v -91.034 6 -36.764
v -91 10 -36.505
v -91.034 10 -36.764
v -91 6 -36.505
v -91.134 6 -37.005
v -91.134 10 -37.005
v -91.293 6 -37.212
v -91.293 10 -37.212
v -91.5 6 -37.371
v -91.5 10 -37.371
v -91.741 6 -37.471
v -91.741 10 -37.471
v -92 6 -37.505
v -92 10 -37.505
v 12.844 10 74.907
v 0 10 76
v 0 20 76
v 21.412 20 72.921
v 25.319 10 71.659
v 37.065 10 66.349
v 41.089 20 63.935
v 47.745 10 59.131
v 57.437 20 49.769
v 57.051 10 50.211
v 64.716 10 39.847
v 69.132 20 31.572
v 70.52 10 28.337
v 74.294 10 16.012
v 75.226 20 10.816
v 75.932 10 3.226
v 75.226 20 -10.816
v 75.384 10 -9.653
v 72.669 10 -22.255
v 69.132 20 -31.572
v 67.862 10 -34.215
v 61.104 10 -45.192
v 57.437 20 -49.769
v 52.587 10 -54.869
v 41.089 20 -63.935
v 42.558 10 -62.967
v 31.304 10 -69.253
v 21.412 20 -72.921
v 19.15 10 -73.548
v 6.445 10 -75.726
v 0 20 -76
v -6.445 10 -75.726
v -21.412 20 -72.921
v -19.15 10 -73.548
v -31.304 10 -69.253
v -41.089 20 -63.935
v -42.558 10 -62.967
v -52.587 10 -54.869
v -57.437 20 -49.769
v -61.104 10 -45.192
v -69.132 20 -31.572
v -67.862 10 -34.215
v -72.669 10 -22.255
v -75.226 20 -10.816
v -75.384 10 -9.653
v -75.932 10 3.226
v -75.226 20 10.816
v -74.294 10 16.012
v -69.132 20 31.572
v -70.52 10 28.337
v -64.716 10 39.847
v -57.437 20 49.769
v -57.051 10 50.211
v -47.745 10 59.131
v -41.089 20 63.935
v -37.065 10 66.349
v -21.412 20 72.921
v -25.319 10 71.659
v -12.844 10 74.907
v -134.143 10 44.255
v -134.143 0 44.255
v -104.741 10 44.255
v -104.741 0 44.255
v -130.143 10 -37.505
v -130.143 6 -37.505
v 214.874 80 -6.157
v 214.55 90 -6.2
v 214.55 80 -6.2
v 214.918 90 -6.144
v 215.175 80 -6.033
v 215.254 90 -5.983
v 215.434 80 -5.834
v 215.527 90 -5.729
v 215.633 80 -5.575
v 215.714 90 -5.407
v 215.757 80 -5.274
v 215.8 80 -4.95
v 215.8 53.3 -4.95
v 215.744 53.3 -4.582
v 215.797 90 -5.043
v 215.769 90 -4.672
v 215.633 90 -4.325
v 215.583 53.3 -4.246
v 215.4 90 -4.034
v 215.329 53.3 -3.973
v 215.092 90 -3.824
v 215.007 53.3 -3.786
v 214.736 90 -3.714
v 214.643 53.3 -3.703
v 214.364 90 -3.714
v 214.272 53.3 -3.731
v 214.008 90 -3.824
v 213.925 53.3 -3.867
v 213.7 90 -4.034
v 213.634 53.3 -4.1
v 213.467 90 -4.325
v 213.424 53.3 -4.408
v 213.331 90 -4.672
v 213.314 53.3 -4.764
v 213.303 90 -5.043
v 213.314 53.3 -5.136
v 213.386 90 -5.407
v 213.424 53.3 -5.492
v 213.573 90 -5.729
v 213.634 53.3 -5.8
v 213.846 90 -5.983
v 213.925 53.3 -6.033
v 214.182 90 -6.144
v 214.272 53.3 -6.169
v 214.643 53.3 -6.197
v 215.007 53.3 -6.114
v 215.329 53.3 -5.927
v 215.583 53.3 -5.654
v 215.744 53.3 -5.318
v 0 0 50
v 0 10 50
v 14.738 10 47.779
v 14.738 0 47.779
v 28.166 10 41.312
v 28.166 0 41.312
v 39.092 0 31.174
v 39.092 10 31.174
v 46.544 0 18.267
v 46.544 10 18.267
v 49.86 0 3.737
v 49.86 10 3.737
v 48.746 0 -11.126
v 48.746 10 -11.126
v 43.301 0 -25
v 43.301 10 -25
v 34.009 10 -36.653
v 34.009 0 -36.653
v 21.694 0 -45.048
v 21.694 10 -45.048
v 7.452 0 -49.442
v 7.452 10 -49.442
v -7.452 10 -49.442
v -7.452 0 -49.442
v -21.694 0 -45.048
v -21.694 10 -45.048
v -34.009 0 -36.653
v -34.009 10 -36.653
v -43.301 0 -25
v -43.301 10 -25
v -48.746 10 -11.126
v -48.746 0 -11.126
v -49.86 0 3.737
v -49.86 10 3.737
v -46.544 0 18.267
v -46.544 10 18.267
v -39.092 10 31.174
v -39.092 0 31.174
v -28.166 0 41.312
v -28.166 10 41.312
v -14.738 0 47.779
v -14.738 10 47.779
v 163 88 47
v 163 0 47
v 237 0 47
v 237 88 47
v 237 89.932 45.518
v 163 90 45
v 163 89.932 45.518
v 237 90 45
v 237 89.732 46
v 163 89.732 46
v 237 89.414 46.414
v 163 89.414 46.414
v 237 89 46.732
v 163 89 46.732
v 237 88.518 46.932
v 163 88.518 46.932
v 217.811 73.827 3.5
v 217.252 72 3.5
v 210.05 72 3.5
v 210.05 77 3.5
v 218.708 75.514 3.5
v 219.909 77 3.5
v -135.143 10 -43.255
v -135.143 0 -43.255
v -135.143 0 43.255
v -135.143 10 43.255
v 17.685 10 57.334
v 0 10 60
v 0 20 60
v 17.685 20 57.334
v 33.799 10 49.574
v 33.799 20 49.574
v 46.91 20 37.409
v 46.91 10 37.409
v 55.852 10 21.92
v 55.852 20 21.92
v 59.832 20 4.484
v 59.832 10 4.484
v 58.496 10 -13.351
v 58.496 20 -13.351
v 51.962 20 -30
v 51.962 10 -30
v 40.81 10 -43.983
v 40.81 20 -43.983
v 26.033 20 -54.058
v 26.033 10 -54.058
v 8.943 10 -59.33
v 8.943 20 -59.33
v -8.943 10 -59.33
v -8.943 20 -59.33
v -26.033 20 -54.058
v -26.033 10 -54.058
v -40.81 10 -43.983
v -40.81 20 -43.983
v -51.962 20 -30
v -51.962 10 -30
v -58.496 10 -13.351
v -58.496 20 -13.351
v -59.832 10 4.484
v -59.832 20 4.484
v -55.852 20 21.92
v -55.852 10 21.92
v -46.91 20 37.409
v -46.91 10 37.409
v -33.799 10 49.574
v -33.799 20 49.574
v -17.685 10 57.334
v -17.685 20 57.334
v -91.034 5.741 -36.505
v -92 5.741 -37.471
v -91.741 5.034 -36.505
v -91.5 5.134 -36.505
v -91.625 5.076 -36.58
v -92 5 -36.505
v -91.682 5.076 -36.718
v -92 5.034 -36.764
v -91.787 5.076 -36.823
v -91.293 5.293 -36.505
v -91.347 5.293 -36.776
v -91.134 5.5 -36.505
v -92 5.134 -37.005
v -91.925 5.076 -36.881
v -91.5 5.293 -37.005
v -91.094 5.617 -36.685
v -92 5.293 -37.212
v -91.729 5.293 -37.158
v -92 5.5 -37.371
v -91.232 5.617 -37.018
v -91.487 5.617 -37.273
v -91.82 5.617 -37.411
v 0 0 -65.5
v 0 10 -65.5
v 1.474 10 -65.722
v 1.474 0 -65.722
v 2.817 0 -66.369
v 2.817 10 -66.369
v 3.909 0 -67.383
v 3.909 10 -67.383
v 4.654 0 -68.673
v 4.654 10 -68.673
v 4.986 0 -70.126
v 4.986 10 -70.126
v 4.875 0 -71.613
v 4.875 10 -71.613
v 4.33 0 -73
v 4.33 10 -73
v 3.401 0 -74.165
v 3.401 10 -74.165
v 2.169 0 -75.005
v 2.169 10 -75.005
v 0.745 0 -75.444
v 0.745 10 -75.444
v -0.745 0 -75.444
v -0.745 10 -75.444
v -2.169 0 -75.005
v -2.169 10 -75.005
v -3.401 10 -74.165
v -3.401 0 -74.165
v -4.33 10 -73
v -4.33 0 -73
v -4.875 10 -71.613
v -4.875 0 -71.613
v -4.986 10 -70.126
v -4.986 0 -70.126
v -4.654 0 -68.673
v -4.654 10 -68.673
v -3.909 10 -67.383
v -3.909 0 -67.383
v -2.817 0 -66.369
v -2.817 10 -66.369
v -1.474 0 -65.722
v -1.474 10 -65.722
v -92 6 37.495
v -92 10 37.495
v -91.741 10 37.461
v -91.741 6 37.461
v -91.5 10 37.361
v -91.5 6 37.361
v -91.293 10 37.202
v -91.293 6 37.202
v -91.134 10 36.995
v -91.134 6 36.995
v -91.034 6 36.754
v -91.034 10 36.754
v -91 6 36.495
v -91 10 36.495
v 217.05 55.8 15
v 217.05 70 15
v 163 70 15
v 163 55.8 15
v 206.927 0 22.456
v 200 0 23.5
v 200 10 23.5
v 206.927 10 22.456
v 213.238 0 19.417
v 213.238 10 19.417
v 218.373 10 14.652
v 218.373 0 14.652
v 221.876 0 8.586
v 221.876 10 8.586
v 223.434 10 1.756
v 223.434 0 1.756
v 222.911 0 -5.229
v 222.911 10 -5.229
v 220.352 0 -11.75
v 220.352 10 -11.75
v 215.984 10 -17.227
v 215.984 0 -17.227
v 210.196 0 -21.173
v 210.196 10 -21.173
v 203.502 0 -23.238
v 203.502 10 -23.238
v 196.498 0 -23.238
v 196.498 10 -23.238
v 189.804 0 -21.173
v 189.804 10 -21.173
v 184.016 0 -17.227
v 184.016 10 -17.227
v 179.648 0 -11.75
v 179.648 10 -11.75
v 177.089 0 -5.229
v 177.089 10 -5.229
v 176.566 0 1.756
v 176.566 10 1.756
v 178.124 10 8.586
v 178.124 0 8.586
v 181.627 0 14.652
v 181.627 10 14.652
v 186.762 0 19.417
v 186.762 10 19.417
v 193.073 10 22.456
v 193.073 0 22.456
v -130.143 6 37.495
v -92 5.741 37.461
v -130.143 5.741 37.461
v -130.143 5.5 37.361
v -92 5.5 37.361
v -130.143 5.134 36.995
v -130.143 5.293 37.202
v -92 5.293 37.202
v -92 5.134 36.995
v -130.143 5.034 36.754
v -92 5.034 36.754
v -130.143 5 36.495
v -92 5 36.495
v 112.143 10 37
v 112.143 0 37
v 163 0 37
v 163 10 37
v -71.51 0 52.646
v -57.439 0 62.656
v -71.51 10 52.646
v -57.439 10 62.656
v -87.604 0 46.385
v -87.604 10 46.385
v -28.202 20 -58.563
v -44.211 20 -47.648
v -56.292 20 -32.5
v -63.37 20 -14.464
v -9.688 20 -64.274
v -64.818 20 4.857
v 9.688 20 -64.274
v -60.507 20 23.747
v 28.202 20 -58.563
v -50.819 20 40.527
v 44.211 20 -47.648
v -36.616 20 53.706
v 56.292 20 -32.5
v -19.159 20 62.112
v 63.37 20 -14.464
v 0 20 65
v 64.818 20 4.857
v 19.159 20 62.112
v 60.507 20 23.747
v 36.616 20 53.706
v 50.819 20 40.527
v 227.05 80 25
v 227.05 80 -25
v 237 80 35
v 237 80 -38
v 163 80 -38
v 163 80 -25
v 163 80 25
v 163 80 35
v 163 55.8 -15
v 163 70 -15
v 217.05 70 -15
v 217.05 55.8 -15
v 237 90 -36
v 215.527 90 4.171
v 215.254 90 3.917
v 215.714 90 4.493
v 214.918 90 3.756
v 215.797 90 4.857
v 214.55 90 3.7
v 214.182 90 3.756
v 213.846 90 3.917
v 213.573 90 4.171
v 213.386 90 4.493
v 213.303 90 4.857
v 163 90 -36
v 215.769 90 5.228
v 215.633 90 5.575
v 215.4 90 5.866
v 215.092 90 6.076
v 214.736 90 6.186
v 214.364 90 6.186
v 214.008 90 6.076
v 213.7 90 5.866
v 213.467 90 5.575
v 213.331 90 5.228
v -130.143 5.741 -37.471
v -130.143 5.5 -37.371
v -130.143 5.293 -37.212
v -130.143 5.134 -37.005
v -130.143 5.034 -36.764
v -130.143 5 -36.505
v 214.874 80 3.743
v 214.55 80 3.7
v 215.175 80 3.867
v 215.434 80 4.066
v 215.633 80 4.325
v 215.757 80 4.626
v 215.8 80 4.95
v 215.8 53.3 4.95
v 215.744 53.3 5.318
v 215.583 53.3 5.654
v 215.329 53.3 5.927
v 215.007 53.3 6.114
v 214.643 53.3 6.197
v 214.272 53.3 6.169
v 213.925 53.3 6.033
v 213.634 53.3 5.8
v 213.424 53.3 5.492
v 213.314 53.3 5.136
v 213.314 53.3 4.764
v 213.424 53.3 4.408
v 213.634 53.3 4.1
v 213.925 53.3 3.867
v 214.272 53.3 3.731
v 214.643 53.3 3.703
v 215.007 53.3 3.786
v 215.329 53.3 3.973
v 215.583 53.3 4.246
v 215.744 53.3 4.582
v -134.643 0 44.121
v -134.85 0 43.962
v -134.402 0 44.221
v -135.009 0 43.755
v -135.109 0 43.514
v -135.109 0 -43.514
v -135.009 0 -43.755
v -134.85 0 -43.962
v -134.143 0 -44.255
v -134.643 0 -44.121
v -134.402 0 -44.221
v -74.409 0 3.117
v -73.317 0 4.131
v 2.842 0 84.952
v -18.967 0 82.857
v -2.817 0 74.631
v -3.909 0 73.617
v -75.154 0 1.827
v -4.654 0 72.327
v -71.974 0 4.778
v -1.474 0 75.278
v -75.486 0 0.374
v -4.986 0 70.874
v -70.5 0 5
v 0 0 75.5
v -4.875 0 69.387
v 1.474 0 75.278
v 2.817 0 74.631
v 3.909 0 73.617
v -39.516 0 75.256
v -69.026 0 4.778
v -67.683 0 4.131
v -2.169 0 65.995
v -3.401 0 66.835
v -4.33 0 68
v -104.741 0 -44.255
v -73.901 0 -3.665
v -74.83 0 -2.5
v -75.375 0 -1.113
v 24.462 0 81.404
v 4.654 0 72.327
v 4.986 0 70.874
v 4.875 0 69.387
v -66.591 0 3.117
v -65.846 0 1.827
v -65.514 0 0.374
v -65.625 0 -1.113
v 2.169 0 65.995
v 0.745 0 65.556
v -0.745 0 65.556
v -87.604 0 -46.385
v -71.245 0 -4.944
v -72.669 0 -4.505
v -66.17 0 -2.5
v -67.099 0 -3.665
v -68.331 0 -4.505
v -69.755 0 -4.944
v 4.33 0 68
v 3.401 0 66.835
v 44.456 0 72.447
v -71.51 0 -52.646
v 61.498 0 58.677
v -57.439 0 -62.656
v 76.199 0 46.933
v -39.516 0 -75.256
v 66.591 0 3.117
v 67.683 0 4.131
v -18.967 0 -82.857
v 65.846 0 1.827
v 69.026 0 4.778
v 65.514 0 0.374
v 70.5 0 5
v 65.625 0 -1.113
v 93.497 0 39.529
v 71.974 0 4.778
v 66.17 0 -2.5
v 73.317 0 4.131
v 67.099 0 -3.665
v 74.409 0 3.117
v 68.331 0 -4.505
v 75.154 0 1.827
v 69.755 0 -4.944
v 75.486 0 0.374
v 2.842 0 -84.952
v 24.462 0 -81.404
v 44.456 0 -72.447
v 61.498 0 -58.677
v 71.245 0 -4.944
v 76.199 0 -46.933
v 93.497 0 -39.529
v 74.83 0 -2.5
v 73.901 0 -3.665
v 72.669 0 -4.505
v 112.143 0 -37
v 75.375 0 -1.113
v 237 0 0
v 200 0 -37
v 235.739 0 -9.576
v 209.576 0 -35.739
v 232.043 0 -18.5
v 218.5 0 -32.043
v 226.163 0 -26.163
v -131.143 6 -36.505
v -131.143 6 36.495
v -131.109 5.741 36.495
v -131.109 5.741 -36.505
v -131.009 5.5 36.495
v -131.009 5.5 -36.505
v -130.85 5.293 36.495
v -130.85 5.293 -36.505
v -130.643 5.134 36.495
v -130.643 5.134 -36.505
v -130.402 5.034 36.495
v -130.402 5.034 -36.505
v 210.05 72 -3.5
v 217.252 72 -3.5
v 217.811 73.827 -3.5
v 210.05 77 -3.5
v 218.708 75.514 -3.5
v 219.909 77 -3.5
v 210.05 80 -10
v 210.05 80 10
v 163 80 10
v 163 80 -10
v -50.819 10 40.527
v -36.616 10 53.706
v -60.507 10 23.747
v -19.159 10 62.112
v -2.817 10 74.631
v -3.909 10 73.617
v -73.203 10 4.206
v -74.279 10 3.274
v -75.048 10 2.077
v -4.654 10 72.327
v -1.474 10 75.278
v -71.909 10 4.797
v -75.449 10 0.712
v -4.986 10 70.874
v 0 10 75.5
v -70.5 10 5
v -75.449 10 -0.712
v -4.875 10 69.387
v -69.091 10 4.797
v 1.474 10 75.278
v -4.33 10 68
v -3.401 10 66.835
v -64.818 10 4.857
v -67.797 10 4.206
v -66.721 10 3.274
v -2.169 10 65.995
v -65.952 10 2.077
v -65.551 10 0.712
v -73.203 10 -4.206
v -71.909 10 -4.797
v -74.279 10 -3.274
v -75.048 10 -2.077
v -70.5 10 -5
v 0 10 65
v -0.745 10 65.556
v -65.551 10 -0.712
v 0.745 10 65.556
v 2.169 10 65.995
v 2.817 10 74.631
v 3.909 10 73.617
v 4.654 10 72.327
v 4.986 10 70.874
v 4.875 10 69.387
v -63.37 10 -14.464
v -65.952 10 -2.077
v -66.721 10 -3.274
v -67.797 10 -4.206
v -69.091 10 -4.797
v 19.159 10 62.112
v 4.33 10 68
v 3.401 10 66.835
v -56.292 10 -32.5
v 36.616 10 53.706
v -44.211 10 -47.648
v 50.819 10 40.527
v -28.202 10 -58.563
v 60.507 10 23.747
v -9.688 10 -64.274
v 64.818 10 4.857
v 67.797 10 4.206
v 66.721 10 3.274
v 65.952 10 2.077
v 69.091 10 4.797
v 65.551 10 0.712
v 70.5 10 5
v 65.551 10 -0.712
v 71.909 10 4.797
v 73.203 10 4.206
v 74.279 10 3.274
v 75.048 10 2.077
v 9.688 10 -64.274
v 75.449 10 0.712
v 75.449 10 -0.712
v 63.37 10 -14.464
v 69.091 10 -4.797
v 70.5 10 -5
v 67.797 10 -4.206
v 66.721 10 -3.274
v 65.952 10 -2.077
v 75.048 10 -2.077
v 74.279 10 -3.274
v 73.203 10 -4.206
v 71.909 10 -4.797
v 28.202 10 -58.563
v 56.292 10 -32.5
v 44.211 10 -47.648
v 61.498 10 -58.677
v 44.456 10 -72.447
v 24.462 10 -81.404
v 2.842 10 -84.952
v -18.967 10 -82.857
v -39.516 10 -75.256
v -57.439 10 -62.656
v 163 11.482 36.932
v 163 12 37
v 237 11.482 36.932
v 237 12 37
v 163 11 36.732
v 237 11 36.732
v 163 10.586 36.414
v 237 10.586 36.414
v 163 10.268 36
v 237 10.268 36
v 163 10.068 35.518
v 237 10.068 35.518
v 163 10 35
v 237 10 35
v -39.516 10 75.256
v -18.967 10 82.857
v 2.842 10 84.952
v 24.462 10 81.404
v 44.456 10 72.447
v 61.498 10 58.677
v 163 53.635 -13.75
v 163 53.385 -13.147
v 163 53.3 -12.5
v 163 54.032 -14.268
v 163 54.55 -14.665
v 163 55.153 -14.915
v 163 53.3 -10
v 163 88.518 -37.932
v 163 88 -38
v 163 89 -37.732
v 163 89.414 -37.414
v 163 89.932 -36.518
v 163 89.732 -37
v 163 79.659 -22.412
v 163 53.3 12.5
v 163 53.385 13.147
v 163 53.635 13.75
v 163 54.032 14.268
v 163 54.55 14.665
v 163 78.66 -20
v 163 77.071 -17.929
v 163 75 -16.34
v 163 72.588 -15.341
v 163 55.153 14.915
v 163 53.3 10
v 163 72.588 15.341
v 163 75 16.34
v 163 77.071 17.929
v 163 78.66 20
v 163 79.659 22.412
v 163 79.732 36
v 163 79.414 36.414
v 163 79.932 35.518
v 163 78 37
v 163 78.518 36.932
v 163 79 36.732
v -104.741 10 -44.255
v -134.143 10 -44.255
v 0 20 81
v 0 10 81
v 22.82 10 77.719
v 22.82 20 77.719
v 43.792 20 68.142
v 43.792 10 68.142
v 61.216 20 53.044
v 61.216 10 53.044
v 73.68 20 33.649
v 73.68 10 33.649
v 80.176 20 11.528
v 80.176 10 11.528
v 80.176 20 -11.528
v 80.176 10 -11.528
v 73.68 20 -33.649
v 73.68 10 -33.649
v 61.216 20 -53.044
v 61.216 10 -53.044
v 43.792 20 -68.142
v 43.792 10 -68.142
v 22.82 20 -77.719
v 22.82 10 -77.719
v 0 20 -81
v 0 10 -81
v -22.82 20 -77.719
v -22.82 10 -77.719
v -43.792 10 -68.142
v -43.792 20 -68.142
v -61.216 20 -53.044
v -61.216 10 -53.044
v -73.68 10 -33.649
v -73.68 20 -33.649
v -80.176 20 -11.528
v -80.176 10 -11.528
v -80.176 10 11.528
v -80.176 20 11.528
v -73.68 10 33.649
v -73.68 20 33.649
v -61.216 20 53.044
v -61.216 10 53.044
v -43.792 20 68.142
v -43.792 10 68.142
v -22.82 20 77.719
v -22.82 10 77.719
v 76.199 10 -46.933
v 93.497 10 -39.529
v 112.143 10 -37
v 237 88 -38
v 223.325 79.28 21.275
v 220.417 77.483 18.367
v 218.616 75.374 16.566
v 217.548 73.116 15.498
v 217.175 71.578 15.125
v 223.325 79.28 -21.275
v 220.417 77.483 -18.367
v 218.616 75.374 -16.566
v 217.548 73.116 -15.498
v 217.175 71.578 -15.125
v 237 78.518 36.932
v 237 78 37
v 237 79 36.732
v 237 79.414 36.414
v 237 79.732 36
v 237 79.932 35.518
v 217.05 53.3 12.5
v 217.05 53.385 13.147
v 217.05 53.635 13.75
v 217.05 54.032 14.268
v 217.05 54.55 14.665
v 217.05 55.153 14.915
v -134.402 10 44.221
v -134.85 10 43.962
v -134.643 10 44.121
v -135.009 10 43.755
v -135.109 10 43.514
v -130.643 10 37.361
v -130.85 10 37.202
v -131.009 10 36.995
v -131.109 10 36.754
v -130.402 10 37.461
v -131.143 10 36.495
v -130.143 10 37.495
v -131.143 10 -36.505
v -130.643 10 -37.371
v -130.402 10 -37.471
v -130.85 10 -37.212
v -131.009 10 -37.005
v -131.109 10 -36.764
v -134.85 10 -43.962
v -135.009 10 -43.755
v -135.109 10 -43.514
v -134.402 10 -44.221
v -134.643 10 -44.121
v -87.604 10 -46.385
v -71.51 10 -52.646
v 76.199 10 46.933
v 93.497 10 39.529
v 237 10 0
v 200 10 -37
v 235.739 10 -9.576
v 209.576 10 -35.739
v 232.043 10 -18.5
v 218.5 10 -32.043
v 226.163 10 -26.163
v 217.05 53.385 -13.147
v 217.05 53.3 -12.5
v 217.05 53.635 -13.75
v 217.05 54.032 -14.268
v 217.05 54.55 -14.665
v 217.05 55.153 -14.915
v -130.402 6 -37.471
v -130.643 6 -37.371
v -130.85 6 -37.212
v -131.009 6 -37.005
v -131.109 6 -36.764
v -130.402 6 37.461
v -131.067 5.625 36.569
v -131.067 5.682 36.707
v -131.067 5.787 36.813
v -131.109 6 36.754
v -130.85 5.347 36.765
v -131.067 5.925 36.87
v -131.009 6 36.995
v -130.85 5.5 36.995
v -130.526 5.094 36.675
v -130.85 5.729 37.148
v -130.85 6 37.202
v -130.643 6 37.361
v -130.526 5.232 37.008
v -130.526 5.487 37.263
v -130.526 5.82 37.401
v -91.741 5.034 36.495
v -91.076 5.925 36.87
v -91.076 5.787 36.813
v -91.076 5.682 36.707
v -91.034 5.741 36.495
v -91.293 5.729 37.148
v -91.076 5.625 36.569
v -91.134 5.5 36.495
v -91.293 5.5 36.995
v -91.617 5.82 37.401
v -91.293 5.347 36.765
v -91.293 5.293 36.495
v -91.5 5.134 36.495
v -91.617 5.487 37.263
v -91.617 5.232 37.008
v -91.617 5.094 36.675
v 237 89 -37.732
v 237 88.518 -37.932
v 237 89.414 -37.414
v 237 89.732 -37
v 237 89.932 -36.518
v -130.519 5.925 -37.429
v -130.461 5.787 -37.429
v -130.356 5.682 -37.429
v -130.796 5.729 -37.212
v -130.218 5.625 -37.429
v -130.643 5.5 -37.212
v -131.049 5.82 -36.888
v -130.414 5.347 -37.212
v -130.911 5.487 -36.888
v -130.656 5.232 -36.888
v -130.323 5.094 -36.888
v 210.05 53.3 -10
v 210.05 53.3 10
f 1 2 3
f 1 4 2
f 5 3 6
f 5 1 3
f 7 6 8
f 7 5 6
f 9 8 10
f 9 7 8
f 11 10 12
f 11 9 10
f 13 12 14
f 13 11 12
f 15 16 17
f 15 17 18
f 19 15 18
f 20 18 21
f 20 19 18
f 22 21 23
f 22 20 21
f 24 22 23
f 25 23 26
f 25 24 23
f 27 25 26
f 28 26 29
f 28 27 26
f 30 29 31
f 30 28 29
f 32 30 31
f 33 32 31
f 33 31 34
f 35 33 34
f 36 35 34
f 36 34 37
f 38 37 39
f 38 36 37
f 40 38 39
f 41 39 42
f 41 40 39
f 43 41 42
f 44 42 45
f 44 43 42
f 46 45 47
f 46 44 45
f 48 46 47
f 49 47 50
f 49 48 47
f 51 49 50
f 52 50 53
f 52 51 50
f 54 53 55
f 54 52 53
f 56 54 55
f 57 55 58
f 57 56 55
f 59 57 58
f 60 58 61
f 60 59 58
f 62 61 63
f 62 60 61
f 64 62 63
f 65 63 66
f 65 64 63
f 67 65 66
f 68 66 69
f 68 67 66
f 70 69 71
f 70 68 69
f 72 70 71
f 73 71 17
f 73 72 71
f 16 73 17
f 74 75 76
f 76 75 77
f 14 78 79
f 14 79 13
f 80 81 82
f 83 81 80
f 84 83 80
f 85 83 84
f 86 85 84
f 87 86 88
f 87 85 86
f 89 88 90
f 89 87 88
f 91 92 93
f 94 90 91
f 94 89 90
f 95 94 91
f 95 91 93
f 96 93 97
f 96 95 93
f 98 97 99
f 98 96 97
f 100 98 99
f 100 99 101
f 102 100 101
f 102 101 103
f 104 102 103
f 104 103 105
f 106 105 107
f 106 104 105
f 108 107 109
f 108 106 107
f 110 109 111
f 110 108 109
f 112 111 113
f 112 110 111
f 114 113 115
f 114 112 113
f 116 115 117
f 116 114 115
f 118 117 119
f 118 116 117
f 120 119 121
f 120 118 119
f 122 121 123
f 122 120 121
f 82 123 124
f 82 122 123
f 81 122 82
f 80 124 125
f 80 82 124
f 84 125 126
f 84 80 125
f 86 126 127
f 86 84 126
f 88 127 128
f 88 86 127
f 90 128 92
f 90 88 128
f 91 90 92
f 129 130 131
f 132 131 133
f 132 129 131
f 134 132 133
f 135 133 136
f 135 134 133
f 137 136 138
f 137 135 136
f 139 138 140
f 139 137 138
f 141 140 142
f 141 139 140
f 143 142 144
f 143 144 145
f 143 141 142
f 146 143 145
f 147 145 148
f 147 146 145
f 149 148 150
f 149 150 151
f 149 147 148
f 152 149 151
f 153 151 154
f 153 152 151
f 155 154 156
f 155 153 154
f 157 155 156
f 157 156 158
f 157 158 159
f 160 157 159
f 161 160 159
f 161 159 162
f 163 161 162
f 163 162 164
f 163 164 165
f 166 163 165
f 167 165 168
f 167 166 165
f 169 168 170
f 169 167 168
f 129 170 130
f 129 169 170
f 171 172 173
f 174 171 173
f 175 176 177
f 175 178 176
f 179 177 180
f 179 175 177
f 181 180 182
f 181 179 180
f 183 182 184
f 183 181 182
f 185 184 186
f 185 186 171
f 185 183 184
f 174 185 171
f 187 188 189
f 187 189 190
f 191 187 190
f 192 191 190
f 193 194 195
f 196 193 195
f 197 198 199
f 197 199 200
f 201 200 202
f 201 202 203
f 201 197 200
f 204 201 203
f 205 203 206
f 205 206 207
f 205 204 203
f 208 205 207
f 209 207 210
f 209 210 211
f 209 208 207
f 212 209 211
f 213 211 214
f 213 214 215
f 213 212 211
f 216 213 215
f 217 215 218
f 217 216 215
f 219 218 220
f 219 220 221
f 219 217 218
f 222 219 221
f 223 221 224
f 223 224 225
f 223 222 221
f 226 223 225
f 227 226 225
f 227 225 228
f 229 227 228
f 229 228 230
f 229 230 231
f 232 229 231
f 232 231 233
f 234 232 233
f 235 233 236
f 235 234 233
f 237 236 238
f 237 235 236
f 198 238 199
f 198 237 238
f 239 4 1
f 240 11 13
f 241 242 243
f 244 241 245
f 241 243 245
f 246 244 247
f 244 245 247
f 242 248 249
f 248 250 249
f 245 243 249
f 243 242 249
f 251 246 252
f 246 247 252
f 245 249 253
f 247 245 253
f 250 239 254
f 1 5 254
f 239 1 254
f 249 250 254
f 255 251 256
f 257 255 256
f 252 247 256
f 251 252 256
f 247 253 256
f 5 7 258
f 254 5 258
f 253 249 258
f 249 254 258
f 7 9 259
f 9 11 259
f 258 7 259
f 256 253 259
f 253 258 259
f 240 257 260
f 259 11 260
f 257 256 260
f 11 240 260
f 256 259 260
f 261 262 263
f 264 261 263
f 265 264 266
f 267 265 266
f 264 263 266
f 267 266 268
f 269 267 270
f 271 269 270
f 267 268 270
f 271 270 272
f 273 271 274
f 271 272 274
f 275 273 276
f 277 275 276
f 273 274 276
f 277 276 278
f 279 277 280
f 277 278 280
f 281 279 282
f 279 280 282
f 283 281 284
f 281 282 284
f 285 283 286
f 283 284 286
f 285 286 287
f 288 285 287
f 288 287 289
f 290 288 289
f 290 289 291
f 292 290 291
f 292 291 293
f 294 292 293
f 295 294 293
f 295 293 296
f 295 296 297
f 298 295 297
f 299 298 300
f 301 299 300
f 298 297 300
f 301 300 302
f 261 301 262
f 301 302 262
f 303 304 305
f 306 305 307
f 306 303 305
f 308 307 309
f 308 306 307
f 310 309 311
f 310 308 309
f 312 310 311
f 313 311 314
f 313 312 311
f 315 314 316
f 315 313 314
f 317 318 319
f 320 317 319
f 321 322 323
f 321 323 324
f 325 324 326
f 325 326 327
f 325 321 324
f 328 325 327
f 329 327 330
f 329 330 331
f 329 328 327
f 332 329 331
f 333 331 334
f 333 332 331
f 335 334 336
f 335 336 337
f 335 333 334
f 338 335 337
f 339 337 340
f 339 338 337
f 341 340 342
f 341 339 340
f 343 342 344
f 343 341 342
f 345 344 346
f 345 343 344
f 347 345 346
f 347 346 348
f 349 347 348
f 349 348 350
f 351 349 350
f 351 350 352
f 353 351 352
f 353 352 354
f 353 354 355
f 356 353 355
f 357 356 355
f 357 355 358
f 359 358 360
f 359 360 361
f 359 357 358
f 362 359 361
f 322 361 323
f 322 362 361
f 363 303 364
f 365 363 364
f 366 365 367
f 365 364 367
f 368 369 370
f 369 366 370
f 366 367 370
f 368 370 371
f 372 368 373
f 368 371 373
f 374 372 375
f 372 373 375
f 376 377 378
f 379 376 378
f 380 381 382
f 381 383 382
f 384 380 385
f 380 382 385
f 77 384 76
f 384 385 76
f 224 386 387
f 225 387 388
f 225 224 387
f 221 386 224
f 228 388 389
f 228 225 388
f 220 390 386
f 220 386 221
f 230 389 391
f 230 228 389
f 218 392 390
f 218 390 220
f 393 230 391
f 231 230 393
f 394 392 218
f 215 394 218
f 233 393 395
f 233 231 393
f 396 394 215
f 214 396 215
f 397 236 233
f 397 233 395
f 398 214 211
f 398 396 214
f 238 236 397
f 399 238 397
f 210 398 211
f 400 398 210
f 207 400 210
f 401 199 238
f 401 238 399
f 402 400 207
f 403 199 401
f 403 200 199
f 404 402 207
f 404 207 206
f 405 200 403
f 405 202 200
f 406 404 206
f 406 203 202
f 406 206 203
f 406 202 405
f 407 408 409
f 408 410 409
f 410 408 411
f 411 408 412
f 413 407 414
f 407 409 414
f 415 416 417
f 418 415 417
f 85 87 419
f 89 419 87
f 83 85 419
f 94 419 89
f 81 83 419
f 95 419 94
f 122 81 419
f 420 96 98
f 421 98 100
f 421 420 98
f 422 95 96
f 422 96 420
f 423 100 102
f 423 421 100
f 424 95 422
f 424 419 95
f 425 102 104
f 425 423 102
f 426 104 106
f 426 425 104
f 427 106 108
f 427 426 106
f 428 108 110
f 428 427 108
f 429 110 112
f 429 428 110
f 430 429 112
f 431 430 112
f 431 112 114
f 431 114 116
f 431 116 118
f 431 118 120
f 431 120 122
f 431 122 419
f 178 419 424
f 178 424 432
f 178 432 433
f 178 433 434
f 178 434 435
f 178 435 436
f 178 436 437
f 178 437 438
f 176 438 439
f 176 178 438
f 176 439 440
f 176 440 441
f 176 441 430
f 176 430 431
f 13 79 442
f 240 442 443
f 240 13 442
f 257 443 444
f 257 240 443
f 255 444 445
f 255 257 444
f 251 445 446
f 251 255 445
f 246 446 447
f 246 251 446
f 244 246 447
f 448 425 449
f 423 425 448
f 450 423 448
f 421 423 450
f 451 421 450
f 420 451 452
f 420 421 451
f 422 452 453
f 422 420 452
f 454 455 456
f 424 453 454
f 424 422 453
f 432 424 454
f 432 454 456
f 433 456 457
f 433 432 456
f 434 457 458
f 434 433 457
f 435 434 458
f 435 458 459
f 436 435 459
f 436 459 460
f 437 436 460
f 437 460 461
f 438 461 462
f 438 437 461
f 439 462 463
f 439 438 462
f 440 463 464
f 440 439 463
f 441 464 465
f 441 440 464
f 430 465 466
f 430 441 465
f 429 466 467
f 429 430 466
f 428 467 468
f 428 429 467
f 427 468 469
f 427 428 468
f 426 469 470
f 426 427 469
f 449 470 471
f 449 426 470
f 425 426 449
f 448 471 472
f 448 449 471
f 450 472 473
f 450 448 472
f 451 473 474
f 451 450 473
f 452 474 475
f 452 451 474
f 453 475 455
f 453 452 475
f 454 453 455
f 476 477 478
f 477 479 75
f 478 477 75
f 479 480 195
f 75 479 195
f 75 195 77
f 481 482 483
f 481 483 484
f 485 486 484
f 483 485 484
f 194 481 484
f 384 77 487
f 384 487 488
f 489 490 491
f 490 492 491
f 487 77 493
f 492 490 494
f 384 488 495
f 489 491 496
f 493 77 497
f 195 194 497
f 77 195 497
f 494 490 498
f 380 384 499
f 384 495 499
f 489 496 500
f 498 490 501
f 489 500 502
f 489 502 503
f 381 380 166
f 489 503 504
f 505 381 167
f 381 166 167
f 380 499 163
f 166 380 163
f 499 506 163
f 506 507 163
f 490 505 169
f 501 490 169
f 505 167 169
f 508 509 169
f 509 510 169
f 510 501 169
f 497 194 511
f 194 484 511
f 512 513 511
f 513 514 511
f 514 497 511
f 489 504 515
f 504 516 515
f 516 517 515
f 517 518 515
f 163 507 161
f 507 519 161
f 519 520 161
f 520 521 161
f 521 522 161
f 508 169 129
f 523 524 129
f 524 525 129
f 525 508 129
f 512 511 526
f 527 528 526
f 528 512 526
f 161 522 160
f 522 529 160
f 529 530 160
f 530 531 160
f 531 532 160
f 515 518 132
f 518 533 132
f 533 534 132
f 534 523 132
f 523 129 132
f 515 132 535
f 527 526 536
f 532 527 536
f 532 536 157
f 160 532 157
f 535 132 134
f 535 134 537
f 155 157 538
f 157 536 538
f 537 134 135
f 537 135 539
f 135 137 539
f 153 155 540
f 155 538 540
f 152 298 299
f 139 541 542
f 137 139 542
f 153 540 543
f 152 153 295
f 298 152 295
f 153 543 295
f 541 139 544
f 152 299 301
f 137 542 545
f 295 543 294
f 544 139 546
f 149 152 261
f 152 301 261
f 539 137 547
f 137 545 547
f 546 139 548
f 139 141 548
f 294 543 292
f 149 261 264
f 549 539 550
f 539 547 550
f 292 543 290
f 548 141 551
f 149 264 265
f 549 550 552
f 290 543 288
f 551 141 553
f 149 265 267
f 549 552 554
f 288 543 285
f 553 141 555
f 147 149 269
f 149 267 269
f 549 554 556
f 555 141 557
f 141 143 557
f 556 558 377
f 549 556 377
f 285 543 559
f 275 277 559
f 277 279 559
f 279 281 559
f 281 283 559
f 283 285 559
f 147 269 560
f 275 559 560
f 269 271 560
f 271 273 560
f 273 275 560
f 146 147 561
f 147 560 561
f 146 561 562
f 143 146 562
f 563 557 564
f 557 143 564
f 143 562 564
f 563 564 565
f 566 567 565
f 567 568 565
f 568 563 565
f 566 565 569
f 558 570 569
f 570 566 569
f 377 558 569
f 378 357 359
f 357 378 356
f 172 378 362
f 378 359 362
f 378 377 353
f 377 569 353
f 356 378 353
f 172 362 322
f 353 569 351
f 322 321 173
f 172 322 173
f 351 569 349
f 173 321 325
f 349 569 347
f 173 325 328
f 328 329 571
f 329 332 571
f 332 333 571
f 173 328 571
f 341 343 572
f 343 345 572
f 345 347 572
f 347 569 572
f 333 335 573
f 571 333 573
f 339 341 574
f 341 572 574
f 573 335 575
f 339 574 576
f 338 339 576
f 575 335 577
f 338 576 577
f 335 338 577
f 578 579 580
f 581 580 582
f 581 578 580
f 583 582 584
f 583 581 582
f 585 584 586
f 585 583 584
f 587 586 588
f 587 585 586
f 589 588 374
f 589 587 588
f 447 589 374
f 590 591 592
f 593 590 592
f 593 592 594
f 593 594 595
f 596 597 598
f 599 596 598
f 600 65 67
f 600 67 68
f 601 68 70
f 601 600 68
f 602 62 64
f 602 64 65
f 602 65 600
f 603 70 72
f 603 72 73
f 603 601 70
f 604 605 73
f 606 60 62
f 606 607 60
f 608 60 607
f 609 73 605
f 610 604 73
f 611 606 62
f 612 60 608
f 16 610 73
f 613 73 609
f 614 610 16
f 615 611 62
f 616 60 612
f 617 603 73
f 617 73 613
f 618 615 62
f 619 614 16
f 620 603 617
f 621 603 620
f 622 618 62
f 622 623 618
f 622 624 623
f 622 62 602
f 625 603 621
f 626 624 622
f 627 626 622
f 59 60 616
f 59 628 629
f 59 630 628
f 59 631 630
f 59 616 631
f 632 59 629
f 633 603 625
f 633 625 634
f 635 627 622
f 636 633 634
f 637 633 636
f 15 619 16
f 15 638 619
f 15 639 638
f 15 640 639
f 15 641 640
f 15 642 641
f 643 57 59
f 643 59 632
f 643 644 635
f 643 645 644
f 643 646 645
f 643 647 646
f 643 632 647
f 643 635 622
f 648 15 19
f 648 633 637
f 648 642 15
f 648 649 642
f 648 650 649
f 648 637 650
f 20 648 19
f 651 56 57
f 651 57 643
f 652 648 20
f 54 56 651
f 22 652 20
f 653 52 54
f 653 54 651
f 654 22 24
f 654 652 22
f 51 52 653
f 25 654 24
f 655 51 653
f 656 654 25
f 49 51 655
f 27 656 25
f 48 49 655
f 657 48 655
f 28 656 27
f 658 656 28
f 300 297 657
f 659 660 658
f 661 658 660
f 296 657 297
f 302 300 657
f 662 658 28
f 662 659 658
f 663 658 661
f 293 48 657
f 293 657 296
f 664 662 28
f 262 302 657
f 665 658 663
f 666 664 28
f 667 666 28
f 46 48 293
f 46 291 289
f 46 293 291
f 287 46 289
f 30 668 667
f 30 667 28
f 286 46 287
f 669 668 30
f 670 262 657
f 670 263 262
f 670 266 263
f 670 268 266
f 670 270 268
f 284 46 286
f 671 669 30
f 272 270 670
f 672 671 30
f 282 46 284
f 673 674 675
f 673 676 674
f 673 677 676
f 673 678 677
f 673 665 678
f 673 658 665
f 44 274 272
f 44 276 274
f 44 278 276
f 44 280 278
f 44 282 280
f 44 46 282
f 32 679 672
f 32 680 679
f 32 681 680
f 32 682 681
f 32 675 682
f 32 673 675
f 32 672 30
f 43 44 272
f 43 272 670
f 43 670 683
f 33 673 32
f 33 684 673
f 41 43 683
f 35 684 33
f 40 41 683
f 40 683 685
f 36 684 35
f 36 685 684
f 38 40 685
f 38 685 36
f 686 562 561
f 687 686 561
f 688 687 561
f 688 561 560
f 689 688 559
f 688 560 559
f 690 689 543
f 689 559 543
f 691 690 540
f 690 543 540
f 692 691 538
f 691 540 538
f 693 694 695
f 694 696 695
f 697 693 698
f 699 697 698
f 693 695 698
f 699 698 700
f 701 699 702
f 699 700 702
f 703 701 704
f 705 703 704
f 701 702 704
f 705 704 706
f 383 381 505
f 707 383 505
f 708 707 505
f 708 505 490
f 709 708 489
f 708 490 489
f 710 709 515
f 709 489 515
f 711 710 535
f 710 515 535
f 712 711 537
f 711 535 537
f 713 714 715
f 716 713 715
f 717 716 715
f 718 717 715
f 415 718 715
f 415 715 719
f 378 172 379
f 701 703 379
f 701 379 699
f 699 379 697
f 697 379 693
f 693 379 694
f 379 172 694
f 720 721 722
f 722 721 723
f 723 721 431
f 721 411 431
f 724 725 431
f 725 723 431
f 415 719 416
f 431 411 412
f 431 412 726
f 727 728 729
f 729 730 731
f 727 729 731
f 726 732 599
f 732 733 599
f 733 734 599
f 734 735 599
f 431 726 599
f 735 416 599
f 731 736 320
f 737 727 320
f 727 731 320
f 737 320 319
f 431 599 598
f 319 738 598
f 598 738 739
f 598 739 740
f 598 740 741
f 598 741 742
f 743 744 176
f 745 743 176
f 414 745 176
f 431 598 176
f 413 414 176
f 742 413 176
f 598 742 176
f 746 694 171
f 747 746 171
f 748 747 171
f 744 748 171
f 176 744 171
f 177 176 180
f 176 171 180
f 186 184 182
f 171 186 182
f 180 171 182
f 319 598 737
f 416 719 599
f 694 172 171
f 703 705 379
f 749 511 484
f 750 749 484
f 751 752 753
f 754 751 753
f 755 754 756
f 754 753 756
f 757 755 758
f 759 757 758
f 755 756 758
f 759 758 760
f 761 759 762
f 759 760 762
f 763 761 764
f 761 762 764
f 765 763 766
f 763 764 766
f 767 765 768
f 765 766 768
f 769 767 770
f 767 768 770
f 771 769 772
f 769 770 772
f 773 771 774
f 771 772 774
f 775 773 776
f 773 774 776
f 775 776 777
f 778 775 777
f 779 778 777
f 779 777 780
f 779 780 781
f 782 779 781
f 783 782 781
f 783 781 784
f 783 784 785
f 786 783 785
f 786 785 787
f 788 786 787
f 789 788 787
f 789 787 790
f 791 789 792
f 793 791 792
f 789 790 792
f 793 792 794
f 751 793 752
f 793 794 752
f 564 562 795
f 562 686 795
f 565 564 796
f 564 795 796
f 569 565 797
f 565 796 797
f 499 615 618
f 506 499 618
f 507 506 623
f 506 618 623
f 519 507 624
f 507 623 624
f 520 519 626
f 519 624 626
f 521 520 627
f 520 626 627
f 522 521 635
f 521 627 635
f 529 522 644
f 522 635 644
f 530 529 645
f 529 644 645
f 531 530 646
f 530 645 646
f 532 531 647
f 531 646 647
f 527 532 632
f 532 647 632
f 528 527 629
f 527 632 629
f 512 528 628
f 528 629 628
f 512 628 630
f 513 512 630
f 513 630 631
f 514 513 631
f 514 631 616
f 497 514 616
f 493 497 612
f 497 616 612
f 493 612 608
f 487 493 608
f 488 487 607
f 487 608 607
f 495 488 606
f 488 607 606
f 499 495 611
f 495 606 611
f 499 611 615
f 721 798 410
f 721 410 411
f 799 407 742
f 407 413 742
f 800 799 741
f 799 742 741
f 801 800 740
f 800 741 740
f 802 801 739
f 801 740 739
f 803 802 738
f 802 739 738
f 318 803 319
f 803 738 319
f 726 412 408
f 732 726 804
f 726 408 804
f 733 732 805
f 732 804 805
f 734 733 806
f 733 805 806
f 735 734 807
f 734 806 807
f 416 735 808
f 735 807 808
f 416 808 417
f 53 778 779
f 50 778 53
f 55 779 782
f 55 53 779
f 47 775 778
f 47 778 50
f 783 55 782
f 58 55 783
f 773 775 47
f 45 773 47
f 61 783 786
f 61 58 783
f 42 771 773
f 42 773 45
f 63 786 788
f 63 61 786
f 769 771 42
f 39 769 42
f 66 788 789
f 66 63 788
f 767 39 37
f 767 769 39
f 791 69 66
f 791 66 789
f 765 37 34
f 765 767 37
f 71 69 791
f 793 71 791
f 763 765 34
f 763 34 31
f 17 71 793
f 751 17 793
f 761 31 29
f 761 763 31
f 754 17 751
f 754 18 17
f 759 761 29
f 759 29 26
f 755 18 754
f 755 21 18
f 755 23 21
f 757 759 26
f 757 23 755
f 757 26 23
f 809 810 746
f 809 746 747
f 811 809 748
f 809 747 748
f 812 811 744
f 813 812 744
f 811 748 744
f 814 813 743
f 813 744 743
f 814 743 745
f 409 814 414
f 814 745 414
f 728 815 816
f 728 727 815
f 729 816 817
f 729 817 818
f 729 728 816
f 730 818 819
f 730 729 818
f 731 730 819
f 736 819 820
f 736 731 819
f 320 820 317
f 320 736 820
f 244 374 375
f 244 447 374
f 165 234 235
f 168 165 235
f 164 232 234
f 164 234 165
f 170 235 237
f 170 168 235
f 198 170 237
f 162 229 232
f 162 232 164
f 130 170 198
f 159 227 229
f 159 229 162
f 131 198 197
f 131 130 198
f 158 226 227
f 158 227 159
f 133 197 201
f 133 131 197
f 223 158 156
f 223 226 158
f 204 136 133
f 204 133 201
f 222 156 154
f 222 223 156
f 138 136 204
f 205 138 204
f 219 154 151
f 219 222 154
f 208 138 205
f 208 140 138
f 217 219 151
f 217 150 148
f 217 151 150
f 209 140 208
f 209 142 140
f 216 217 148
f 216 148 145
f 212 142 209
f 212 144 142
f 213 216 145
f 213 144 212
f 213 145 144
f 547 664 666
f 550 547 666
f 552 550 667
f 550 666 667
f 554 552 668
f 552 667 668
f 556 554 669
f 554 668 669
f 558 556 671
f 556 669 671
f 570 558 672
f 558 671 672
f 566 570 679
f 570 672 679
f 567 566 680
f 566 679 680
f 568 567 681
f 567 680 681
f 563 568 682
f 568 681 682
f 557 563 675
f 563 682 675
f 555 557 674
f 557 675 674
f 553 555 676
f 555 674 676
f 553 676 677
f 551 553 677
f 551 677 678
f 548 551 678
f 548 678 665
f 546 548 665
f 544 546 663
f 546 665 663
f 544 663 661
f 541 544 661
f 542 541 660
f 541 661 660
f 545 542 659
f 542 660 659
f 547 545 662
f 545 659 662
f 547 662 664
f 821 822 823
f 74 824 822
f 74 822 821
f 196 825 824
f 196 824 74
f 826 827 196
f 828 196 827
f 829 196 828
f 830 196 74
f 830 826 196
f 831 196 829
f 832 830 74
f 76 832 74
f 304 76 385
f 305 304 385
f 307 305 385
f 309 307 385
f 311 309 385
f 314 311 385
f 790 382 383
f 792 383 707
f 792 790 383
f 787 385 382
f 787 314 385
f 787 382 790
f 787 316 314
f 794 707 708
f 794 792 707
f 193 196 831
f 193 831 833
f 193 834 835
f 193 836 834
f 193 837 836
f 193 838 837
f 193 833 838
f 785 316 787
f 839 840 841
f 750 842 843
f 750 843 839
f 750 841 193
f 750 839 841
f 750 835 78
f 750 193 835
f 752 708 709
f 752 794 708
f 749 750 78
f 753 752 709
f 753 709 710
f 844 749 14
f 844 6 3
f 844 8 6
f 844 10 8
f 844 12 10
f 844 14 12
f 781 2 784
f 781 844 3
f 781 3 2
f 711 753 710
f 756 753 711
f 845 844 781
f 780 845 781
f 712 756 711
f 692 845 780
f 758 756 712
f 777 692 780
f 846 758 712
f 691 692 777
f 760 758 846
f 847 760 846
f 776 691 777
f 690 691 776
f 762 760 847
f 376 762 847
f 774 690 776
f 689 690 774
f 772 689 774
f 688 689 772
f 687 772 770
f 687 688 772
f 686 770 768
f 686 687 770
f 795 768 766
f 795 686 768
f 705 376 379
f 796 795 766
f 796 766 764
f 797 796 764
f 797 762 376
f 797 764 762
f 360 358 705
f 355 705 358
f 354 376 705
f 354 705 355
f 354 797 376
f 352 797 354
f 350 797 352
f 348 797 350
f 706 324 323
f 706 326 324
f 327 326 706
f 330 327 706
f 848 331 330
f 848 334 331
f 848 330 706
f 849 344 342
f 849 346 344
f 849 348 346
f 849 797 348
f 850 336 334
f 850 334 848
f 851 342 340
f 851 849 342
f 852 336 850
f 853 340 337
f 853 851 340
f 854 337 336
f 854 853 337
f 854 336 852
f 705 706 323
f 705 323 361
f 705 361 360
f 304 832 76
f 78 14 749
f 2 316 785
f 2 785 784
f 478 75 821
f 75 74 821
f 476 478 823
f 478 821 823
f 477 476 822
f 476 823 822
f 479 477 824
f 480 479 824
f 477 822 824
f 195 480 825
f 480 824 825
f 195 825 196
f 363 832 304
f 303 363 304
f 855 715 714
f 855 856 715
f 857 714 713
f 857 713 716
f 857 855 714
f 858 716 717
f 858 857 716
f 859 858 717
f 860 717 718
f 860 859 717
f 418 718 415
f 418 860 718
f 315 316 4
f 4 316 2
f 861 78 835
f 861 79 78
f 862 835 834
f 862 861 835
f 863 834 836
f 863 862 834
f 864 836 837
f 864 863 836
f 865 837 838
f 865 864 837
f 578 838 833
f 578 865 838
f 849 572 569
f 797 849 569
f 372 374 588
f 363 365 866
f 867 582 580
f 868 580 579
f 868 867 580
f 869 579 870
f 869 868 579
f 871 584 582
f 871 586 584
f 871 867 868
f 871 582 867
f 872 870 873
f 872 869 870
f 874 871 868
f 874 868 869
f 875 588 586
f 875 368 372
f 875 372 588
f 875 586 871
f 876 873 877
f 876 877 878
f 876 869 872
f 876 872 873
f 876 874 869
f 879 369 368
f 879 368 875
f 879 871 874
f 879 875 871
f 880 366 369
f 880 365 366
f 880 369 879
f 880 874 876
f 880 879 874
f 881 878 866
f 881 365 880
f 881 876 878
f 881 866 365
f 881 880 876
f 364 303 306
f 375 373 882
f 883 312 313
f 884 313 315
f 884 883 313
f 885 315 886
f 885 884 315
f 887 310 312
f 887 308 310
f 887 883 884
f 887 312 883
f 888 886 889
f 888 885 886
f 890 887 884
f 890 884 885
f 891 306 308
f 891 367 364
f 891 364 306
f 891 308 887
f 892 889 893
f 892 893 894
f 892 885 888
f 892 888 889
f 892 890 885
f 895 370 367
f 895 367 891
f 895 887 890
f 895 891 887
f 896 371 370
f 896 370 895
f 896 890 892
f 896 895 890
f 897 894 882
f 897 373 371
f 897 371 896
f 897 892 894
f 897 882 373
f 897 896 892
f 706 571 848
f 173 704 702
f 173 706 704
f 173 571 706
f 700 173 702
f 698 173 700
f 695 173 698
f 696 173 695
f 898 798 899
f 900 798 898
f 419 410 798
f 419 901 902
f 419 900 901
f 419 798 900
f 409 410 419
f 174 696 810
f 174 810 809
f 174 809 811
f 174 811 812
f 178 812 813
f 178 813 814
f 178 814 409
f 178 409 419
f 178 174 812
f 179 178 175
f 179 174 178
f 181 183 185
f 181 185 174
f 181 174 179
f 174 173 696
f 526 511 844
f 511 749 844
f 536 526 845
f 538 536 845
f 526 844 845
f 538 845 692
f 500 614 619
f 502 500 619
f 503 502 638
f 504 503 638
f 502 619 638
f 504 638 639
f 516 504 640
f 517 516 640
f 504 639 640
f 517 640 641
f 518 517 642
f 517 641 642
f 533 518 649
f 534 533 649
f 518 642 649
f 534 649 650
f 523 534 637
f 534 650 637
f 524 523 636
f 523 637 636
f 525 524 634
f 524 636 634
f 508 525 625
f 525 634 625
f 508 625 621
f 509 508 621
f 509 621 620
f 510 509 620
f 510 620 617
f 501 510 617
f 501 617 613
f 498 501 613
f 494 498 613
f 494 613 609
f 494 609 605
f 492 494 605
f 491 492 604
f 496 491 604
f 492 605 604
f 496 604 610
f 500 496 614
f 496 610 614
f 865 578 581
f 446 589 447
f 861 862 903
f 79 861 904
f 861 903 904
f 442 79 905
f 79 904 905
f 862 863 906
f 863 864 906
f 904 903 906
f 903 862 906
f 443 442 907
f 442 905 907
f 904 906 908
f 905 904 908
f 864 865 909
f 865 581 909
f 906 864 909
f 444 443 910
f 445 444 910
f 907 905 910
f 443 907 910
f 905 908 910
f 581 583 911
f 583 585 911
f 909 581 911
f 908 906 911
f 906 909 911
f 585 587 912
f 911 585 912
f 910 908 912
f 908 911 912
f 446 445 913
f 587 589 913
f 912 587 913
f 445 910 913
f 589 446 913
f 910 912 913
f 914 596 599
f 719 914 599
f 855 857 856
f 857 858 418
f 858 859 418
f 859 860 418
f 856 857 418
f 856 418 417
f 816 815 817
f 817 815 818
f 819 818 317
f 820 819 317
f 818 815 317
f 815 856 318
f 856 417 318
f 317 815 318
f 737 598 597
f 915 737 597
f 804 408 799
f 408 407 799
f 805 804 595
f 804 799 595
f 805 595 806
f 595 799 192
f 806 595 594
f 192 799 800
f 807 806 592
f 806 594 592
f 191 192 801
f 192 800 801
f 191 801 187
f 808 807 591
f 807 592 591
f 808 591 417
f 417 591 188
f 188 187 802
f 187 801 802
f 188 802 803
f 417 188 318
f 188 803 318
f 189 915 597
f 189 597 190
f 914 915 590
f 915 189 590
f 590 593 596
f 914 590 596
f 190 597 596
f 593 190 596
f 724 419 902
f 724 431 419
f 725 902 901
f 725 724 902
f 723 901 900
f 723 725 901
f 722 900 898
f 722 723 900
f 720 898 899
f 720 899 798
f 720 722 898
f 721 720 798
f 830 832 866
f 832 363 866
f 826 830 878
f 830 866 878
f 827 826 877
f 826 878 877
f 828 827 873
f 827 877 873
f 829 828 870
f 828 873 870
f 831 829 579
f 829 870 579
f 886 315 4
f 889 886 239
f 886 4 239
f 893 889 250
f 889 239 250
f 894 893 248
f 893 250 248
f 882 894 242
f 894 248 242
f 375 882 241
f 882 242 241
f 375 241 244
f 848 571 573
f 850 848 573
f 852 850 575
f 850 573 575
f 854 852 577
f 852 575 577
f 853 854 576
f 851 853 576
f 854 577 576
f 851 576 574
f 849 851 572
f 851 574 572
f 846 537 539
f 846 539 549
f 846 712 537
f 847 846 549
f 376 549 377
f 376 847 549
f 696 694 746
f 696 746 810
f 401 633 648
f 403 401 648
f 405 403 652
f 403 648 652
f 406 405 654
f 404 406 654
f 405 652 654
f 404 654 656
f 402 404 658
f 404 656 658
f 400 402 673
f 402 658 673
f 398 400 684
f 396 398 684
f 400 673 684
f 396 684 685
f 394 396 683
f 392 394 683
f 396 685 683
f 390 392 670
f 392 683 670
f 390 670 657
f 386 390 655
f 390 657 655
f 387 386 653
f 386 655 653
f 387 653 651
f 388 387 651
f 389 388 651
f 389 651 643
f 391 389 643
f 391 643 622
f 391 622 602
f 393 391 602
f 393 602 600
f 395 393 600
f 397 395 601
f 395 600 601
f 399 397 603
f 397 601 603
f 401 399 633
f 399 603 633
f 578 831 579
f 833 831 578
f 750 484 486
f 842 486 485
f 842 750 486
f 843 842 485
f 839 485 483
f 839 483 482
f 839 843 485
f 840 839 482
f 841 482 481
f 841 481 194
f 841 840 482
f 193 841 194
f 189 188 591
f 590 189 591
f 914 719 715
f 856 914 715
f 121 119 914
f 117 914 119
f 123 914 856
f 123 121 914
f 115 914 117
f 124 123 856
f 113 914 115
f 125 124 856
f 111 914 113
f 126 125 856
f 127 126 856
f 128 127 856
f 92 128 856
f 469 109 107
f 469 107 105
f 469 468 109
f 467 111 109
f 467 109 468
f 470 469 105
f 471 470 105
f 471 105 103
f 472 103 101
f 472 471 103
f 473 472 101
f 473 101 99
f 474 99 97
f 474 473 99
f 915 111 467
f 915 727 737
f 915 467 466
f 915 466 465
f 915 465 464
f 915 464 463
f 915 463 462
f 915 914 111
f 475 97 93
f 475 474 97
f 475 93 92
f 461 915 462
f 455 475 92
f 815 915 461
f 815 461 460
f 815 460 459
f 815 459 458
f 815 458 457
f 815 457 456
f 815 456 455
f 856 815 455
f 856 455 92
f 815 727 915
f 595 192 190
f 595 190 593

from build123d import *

# Parameters (mm, degrees)
CROQUIS1_R                   = 50
CROQUIS1_R_2                 = 23.5
SALIENTE_EXTRUIR1_DEPTH      = 10
REDONDEO1_R                  = 70
CROQUIS2_R                   = 81
CROQUIS2_R_2                 = 76
SALIENTE_EXTRUIR2_DEPTH      = 10
CROQUIS8_W                   = 74
CROQUIS8_H                   = 10
SALIENTE_EXTRUIR4_DEPTH      = 10
CROQUIS9_W                   = 74
CROQUIS9_H                   = 10
SALIENTE_EXTRUIR5_DEPTH      = 80
CROQUIS10_W                  = 74
CROQUIS10_H                  = 10
SALIENTE_EXTRUIR6_DEPTH      = 75
REDONDEO3_R                  = 2
REDONDEO4_R                  = 2
REDONDEO5_R                  = 2
REDONDEO6_R                  = 2
CROQUIS12_R                  = 65
CROQUIS12_R_2                = 60
SALIENTE_EXTRUIR12_DEPTH     = 10
CROQUIS13_R                  = 5
CORTAR_EXTRUIR1_DEPTH        = 10
SALIENTE_EXTRUIR13_OUTLINE_R = 1.25
SALIENTE_EXTRUIR13_DEPTH     = 26.7
REDONDEO7_R                  = 10
CORTAR_EXTRUIR2_START        = -36.7
CROQUIS15_R                  = 1.25
CORTAR_EXTRUIR2_DEPTH        = 36.7
REDONDEO9_R                  = 2.5
CROQUIS17_W                  = 7
CROQUIS17_H                  = 5
CORTAR_EXTRUIR3_DEPTH        = 26.95
CROQUIS18_W                  = 40.143208987
CROQUIS18_H                  = 75
CORTAR_EXTRUIR4_DEPTH        = 5
REDONDEO10_R                 = 1
REDONDEO11_R                 = 1


# Read off the part's stored shape, not the designer's step: Saliente-Extruir13
with BuildPart() as part:
    # Croquis1 → Saliente-Extruir1 (new body)
    with BuildSketch(Plane(origin=(0, 0, 0), x_dir=(1, 0, 0), z_dir=(0, 1, 0))):
        with BuildLine():
            ThreePointArc((-72.570488149, -44.255217205), (4.131356705, -84.899539997), (76.524505879, -37))
            Line((76.524505879, -37), (237, -37))
            Line((237, -37), (237, 0))
            ThreePointArc((237, 0), (226.162950904, 26.162950904), (200, 37))
            Line((200, 37), (76.524505879, 37))
            ThreePointArc((76.524505879, 37), (4.131356705, 84.899539997), (-72.570488149, 44.255217205))
            Line((-72.570488149, 44.255217205), (-135.143208987, 44.255217205))
            Line((-135.143208987, 44.255217205), (-135.143208987, -44.255217205))
            Line((-135.143208987, -44.255217205), (-72.570488149, -44.255217205))
        make_face()
        with Locations(Location((0, 0, 0), (0, 0, 270))):
            Circle(CROQUIS1_R, mode=Mode.SUBTRACT)
        with Locations(Location((200, 0, 0), (0, 0, 270))):
            Circle(CROQUIS1_R_2, mode=Mode.SUBTRACT)
    extrude(amount=SALIENTE_EXTRUIR1_DEPTH)

    # Redondeo1
    redondeo1_edges = [part.edges().sort_by_distance(p)[0] for p in [
        (76.524505879, 5, 37),
        (-72.570488149, 5, 44.255217205),
        (-72.570488149, 5, -44.255217205),
        (76.524505879, 5, -37),
    ]]
    fillet(redondeo1_edges, radius=REDONDEO1_R)

    # Croquis2 → Saliente-Extruir2 (add)
    with BuildSketch(Plane(origin=(0, 10, 0), x_dir=(1, 0, 0), z_dir=(0, 1, 0))):
        with Locations(Location((0, 0, 0), (0, 0, 270))):
            Circle(CROQUIS2_R)
        with Locations(Location((0, 0, 0), (0, 0, 270))):
            Circle(CROQUIS2_R_2, mode=Mode.SUBTRACT)
    extrude(amount=SALIENTE_EXTRUIR2_DEPTH)

    # Croquis8 → Saliente-Extruir4 (add)
    with BuildSketch(Plane.XY.offset(37)):
        with Locations((200, 5)):
            Rectangle(CROQUIS8_W, CROQUIS8_H)
    extrude(amount=SALIENTE_EXTRUIR4_DEPTH)

    # Croquis9 → Saliente-Extruir5 (add)
    with BuildSketch(Plane(origin=(0, 10, 0), x_dir=(1, 0, 0), z_dir=(0, 1, 0))):
        with Locations((200, -42)):
            Rectangle(CROQUIS9_W, CROQUIS9_H)
    extrude(amount=SALIENTE_EXTRUIR5_DEPTH)

    # Croquis10 → Saliente-Extruir6 (add)
    with BuildSketch(Plane(origin=(0, 0, 37), x_dir=(-1, 0, 0), z_dir=(0, 0, -1))):
        with Locations((-200, 85)):
            Rectangle(CROQUIS10_W, CROQUIS10_H)
    extrude(amount=SALIENTE_EXTRUIR6_DEPTH)

    # Redondeo3
    redondeo3_edges = [part.edges().sort_by_distance(p)[0] for p in [
        (200, 10, 37),
    ]]
    fillet(redondeo3_edges, radius=REDONDEO3_R)

    # Redondeo4
    redondeo4_edges = [part.edges().sort_by_distance(p)[0] for p in [
        (200, 80, 37),
    ]]
    fillet(redondeo4_edges, radius=REDONDEO4_R)

    # Redondeo5
    redondeo5_edges = [part.edges().sort_by_distance(p)[0] for p in [
        (200, 90, 47),
    ]]
    fillet(redondeo5_edges, radius=REDONDEO5_R)

    # Redondeo6
    redondeo6_edges = [part.edges().sort_by_distance(p)[0] for p in [
        (200, 90, -38),
    ]]
    fillet(redondeo6_edges, radius=REDONDEO6_R)

    # Croquis12 → Saliente-Extruir12 (add)
    with BuildSketch(Plane(origin=(0, 10, 0), x_dir=(1, 0, 0), z_dir=(0, 1, 0))):
        with Locations(Location((0, 0, 0), (0, 0, 270))):
            Circle(CROQUIS12_R)
        with Locations(Location((0, 0, 0), (0, 0, 270))):
            Circle(CROQUIS12_R_2, mode=Mode.SUBTRACT)
    extrude(amount=SALIENTE_EXTRUIR12_DEPTH)

    # Croquis13 → Cortar-Extruir1 (cut)
    with BuildSketch(Plane(origin=(0, 10, 0), x_dir=(1, 0, 0), z_dir=(0, 1, 0))):
        with Locations(Location((-70.5, 0, 0), (0, 0, 270))):
            Circle(CROQUIS13_R)
        with Locations(Location((0, 70.5, 0), (0, 0, 270))):
            Circle(CROQUIS13_R)
        with Locations(Location((70.5, 0, 0), (0, 0, 270))):
            Circle(CROQUIS13_R)
        with Locations(Location((0, -70.5, 0), (0, 0, 270))):
            Circle(CROQUIS13_R)
    extrude(amount=-CORTAR_EXTRUIR1_DEPTH, mode=Mode.SUBTRACT)

    # Saliente-Extruir13 outline → Saliente-Extruir13 (add)
    with BuildSketch(Plane.XZ.offset(-80)):
        Polygon((163, -10), (163, -15), (217.05, -15), (217.05, 15), (163, 15), (163, 10), (210.05, 10), (210.05, -10), align=None)
        with Locations((214.55, -4.95)):
            Circle(SALIENTE_EXTRUIR13_OUTLINE_R, mode=Mode.SUBTRACT)
        with Locations((214.55, 4.95)):
            Circle(SALIENTE_EXTRUIR13_OUTLINE_R, mode=Mode.SUBTRACT)
    extrude(amount=SALIENTE_EXTRUIR13_DEPTH)

    # Redondeo7
    redondeo7_edges = [part.edges().sort_by_distance(p)[0] for p in [
        (190.025, 80, -15),
        (190.025, 80, 15),
        (217.05, 80, 0),
    ]]
    fillet(redondeo7_edges, radius=REDONDEO7_R)

    # Croquis15 → Cortar-Extruir2 (cut)
    with BuildSketch(Plane.XZ.offset(-53.3).offset(CORTAR_EXTRUIR2_START)):
        with Locations(Location((214.55, 4.95, 0), (0, 0, 270))):
            Circle(CROQUIS15_R)
        with Locations(Location((214.55, -4.95, 0), (0, 0, 270))):
            Circle(CROQUIS15_R)
    extrude(amount=CORTAR_EXTRUIR2_DEPTH, mode=Mode.SUBTRACT)

    # Redondeo9
    redondeo9_edges = [part.edges().sort_by_distance(p)[0] for p in [
        (190.025, 53.3, 15),
        (190.025, 53.3, -15),
    ]]
    fillet(redondeo9_edges, radius=REDONDEO9_R)

    # Croquis17 → Cortar-Extruir3 (cut)
    with BuildSketch(Plane(origin=(237, 0, 0), x_dir=(0, 0, -1), z_dir=(1, 0, 0))):
        with Locations((0, 74.5)):
            Rectangle(CROQUIS17_W, CROQUIS17_H)
    extrude(amount=-CORTAR_EXTRUIR3_DEPTH, mode=Mode.SUBTRACT)

    # Croquis18 → Cortar-Extruir4 (cut)
    with BuildSketch(Plane(origin=(0, 10, 0), x_dir=(1, 0, 0), z_dir=(0, 1, 0))):
        with Locations((-111.071604494, 0.005217205)):
            Rectangle(CROQUIS18_W, CROQUIS18_H)
    extrude(amount=-CORTAR_EXTRUIR4_DEPTH, mode=Mode.SUBTRACT)

    # Redondeo10
    redondeo10_edges = [part.edges().sort_by_distance(p)[0] for p in [
        (-91, 7.5, -37.505217205),
        (-111.071604493, 5, 37.494782795),
        (-91, 7.5, 37.494782795),
        (-131.143208987, 5, -0.005217205),
        (-131.143208987, 7.5, 37.494782795),
        (-131.143208987, 7.5, -37.505217205),
        (-91, 5, -0.005217205),
        (-111.071604493, 5, -37.505217205),
    ]]
    fillet(redondeo10_edges, radius=REDONDEO10_R)

    # Redondeo11
    redondeo11_edges = [part.edges().sort_by_distance(p)[0] for p in [
        (-135.143208987, 5, -44.255217205),
        (-135.143208987, 5, 44.255217205),
    ]]
    fillet(redondeo11_edges, radius=REDONDEO11_R)


solid = part.part
